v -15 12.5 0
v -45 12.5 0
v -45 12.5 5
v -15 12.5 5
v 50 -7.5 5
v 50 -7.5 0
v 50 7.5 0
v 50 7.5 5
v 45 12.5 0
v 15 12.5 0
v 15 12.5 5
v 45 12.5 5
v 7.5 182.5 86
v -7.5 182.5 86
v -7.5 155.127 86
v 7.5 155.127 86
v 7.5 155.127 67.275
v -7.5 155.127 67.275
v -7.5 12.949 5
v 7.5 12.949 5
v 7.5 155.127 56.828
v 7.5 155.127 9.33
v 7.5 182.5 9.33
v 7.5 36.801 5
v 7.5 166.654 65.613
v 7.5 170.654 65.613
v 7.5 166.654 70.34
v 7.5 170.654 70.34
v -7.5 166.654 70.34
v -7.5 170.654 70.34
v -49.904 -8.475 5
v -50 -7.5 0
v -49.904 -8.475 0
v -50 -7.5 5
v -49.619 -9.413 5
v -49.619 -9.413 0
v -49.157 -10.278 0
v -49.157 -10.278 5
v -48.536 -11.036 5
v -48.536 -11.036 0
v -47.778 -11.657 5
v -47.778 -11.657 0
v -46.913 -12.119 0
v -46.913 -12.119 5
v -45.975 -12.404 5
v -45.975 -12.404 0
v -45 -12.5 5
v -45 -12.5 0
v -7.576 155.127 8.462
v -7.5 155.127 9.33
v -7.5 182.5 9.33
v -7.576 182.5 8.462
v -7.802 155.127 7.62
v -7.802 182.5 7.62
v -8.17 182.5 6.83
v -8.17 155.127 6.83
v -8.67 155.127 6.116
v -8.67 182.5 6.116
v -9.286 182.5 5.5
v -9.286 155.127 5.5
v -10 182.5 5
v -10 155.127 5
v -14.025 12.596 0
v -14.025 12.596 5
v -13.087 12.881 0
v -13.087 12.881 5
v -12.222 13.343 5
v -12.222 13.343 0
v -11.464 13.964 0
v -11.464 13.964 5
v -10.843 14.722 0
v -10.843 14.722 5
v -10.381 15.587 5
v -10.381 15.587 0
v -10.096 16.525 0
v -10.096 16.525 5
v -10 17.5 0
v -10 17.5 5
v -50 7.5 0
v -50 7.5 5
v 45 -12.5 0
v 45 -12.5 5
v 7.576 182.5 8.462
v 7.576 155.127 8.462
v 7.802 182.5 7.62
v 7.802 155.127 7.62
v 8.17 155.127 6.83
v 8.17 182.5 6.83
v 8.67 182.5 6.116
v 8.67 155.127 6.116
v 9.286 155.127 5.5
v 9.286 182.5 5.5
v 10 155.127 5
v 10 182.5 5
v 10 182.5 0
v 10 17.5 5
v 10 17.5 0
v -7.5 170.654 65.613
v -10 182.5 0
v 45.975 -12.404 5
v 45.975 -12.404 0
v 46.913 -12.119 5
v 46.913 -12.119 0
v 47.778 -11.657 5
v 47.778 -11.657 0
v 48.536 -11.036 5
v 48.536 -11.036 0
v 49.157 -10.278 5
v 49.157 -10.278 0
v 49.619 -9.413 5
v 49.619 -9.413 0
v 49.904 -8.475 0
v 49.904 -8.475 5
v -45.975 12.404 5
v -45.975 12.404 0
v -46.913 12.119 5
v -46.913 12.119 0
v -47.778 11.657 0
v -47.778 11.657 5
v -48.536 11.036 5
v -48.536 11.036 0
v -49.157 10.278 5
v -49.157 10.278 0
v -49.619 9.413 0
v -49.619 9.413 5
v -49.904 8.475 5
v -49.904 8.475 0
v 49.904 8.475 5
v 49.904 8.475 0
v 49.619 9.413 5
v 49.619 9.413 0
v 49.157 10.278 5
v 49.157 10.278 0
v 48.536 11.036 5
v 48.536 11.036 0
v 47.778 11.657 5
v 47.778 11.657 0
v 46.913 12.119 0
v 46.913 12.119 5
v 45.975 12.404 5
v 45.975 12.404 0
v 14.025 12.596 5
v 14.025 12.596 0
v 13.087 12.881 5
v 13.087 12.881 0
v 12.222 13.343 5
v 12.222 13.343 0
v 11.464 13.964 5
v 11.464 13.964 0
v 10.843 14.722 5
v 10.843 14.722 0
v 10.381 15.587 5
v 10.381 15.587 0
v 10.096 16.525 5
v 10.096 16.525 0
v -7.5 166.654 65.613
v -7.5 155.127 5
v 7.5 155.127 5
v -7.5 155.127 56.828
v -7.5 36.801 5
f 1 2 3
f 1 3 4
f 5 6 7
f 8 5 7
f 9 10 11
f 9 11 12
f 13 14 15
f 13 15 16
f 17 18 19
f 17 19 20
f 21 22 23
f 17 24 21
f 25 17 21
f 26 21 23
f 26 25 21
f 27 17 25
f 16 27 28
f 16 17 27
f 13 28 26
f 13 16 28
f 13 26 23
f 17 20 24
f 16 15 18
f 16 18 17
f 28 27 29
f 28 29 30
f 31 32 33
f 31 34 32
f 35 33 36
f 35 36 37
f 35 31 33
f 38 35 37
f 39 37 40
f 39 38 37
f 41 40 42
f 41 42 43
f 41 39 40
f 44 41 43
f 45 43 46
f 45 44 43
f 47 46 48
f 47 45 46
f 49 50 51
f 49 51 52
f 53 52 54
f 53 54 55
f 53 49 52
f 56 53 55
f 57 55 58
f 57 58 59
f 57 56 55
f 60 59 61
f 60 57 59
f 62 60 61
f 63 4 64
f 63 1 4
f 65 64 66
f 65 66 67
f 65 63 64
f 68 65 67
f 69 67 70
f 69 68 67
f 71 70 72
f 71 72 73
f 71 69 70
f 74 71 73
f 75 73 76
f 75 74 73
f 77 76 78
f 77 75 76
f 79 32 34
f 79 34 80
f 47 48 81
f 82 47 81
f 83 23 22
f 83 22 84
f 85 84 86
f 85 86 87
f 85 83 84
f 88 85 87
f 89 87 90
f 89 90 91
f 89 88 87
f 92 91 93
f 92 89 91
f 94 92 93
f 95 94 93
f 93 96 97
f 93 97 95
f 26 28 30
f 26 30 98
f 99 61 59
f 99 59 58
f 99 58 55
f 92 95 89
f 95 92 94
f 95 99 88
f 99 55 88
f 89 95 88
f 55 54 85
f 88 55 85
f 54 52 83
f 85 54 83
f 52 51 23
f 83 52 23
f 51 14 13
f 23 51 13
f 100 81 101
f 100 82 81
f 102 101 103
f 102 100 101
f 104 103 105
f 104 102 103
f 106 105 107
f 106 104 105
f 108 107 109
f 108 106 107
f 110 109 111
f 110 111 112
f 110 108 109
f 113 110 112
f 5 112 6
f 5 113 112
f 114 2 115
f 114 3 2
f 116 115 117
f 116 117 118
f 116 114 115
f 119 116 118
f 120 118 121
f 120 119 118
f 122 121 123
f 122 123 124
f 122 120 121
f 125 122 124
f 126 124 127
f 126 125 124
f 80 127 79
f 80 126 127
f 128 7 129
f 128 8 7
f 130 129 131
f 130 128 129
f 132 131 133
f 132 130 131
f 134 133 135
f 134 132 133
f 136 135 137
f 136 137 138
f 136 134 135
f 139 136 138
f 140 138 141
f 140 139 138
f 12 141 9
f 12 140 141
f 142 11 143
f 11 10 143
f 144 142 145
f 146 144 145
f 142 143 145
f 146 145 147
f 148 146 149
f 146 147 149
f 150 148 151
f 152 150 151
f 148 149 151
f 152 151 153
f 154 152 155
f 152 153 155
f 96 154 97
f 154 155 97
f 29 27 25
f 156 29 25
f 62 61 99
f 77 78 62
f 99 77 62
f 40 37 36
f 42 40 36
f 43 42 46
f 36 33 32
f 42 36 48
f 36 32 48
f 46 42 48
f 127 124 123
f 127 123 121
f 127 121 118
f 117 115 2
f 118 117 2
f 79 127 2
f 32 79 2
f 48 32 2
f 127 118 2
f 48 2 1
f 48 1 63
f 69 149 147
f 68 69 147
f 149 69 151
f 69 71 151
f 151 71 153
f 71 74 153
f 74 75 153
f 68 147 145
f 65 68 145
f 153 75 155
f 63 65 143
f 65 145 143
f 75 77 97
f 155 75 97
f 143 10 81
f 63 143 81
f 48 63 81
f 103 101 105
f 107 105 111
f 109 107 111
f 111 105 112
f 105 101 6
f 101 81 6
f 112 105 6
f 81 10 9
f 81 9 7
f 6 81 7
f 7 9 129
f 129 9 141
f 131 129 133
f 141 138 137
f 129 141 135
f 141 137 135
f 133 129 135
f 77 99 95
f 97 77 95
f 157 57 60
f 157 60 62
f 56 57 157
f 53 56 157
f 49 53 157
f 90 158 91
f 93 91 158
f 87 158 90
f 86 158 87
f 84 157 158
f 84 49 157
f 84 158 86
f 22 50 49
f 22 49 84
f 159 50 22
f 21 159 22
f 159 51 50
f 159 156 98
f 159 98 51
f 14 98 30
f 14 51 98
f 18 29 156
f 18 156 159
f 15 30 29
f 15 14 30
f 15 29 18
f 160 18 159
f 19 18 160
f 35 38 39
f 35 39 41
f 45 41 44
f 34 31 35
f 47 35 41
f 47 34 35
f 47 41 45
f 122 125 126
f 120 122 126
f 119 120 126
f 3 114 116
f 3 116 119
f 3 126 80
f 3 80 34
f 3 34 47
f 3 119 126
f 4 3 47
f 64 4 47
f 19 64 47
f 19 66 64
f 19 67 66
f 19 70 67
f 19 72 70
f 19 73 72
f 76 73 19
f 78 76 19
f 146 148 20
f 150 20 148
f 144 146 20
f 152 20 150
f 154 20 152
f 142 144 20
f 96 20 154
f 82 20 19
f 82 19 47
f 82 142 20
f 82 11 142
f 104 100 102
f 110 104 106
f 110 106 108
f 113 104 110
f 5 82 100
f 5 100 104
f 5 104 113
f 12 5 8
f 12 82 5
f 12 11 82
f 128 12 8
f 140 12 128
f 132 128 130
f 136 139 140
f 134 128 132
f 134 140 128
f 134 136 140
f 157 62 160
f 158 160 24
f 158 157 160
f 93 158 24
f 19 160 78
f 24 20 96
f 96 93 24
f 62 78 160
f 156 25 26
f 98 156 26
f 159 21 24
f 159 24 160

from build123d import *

# Parameters (mm, degrees)
SKETCH_1_W          = 100
SKETCH_1_H          = 25
EXTRUDE_1_DEPTH     = 5
SKETCH_2_W          = 20
SKETCH_2_H          = 5
EXTRUDE_2_DEPTH     = 170
SKETCH_3_W          = 15
SKETCH_3_H          = 27.372730927
EXTRUDE_3_DEPTH     = 81
FILLET_1_R          = 5
SKETCH_6_W          = 15
SKETCH_6_H          = 23.851489588
FILLET_2_R          = 5
FILLET_3_R          = 5
SKETCH_5_W          = 4.727272728
SKETCH_5_H          = 4
CUT_EXTRUDE_3_DEPTH = 100


with BuildPart() as part:
    # 草图1 → 凸台-拉伸1 (new body)
    with BuildSketch(Plane.XY):
        Rectangle(SKETCH_1_W, SKETCH_1_H)
    extrude(amount=EXTRUDE_1_DEPTH)

    # 草图2 → 凸台-拉伸2 (add)
    with BuildSketch(Plane(origin=(0, 12.5, 0), x_dir=(1, 0, 0), z_dir=(0, 1, 0))):
        with Locations((0, -2.5)):
            Rectangle(SKETCH_2_W, SKETCH_2_H)
    extrude(amount=EXTRUDE_2_DEPTH)

    # 草图3 → 凸台-拉伸3 (add)
    with BuildSketch(Plane.XY.offset(5)):
        with Locations((0, 168.813634536)):
            Rectangle(SKETCH_3_W, SKETCH_3_H)
    extrude(amount=EXTRUDE_3_DEPTH)

    # 圆角1
    # the kernel refuses this fillet: 5 mm, written as the material it adds along each edge
    with BuildSketch(Plane(origin=(-7.5, 155.127269073, 5), x_dir=(-1, 0, 0), z_dir=(0, 1, 0)), Plane(origin=(7.5, 182.5, 5), x_dir=(1, 0, 0), z_dir=(0, -1, 0))) as fillet_1_piece_1:
        with BuildLine():
            CenterArc((5, 4.330127019), FILLET_1_R, 180, 60)
            Line((0, 4.330127019), (-0.1, 4.330127019))
            Line((-0.1, 4.330127019), (-0.1, 0))
            Line((-0.1, 0), (0, -0.1))
            ThreePointArc((0, -0.1), (1.25, -0.1), (2.45, -0.08660254))
            Line((2.45, -0.08660254), (2.5, 0))
        make_face()
    extrude(amount=27.372730927)

    # 扫描1: sweep along a path in 草图7
    with BuildLine(Plane(origin=(0, 0, 0), x_dir=(0, 0, -1), z_dir=(1, 0, 0))) as sweep_1_path:
        Line((-5, 24.875224673), (-67.976637777, 168.654354293))
    # 草图6 → 扫描1 (sweep)
    with BuildSketch(Plane.XY.offset(5)):
        with Locations((0, 24.875224673)):
            Rectangle(SKETCH_6_W, SKETCH_6_H)
    sweep(path=sweep_1_path.line)

    # 圆角2
    fillet_2_edges = [part.edges().sort_by_distance(p)[0] for p in [
        (-10, 12.5, 2.5),
        (10, 12.5, 2.5),
    ]]
    fillet(fillet_2_edges, radius=FILLET_2_R)

    # 圆角3
    fillet_3_edges = [part.edges().sort_by_distance(p)[0] for p in [
        (-50, 12.5, 2.5),
        (50, 12.5, 2.5),
        (50, -12.5, 2.5),
        (-50, -12.5, 2.5),
    ]]
    fillet(fillet_3_edges, radius=FILLET_3_R)

    # 草图5 → 切除-拉伸3 (cut)
    with BuildSketch(Plane(origin=(7.5, 0, 0), x_dir=(0, 0, -1), z_dir=(1, 0, 0))):
        with Locations((-67.976637777, 168.654354293)):
            Rectangle(SKETCH_5_W, SKETCH_5_H)
    extrude(amount=-CUT_EXTRUDE_3_DEPTH, mode=Mode.SUBTRACT)


solid = part.part
